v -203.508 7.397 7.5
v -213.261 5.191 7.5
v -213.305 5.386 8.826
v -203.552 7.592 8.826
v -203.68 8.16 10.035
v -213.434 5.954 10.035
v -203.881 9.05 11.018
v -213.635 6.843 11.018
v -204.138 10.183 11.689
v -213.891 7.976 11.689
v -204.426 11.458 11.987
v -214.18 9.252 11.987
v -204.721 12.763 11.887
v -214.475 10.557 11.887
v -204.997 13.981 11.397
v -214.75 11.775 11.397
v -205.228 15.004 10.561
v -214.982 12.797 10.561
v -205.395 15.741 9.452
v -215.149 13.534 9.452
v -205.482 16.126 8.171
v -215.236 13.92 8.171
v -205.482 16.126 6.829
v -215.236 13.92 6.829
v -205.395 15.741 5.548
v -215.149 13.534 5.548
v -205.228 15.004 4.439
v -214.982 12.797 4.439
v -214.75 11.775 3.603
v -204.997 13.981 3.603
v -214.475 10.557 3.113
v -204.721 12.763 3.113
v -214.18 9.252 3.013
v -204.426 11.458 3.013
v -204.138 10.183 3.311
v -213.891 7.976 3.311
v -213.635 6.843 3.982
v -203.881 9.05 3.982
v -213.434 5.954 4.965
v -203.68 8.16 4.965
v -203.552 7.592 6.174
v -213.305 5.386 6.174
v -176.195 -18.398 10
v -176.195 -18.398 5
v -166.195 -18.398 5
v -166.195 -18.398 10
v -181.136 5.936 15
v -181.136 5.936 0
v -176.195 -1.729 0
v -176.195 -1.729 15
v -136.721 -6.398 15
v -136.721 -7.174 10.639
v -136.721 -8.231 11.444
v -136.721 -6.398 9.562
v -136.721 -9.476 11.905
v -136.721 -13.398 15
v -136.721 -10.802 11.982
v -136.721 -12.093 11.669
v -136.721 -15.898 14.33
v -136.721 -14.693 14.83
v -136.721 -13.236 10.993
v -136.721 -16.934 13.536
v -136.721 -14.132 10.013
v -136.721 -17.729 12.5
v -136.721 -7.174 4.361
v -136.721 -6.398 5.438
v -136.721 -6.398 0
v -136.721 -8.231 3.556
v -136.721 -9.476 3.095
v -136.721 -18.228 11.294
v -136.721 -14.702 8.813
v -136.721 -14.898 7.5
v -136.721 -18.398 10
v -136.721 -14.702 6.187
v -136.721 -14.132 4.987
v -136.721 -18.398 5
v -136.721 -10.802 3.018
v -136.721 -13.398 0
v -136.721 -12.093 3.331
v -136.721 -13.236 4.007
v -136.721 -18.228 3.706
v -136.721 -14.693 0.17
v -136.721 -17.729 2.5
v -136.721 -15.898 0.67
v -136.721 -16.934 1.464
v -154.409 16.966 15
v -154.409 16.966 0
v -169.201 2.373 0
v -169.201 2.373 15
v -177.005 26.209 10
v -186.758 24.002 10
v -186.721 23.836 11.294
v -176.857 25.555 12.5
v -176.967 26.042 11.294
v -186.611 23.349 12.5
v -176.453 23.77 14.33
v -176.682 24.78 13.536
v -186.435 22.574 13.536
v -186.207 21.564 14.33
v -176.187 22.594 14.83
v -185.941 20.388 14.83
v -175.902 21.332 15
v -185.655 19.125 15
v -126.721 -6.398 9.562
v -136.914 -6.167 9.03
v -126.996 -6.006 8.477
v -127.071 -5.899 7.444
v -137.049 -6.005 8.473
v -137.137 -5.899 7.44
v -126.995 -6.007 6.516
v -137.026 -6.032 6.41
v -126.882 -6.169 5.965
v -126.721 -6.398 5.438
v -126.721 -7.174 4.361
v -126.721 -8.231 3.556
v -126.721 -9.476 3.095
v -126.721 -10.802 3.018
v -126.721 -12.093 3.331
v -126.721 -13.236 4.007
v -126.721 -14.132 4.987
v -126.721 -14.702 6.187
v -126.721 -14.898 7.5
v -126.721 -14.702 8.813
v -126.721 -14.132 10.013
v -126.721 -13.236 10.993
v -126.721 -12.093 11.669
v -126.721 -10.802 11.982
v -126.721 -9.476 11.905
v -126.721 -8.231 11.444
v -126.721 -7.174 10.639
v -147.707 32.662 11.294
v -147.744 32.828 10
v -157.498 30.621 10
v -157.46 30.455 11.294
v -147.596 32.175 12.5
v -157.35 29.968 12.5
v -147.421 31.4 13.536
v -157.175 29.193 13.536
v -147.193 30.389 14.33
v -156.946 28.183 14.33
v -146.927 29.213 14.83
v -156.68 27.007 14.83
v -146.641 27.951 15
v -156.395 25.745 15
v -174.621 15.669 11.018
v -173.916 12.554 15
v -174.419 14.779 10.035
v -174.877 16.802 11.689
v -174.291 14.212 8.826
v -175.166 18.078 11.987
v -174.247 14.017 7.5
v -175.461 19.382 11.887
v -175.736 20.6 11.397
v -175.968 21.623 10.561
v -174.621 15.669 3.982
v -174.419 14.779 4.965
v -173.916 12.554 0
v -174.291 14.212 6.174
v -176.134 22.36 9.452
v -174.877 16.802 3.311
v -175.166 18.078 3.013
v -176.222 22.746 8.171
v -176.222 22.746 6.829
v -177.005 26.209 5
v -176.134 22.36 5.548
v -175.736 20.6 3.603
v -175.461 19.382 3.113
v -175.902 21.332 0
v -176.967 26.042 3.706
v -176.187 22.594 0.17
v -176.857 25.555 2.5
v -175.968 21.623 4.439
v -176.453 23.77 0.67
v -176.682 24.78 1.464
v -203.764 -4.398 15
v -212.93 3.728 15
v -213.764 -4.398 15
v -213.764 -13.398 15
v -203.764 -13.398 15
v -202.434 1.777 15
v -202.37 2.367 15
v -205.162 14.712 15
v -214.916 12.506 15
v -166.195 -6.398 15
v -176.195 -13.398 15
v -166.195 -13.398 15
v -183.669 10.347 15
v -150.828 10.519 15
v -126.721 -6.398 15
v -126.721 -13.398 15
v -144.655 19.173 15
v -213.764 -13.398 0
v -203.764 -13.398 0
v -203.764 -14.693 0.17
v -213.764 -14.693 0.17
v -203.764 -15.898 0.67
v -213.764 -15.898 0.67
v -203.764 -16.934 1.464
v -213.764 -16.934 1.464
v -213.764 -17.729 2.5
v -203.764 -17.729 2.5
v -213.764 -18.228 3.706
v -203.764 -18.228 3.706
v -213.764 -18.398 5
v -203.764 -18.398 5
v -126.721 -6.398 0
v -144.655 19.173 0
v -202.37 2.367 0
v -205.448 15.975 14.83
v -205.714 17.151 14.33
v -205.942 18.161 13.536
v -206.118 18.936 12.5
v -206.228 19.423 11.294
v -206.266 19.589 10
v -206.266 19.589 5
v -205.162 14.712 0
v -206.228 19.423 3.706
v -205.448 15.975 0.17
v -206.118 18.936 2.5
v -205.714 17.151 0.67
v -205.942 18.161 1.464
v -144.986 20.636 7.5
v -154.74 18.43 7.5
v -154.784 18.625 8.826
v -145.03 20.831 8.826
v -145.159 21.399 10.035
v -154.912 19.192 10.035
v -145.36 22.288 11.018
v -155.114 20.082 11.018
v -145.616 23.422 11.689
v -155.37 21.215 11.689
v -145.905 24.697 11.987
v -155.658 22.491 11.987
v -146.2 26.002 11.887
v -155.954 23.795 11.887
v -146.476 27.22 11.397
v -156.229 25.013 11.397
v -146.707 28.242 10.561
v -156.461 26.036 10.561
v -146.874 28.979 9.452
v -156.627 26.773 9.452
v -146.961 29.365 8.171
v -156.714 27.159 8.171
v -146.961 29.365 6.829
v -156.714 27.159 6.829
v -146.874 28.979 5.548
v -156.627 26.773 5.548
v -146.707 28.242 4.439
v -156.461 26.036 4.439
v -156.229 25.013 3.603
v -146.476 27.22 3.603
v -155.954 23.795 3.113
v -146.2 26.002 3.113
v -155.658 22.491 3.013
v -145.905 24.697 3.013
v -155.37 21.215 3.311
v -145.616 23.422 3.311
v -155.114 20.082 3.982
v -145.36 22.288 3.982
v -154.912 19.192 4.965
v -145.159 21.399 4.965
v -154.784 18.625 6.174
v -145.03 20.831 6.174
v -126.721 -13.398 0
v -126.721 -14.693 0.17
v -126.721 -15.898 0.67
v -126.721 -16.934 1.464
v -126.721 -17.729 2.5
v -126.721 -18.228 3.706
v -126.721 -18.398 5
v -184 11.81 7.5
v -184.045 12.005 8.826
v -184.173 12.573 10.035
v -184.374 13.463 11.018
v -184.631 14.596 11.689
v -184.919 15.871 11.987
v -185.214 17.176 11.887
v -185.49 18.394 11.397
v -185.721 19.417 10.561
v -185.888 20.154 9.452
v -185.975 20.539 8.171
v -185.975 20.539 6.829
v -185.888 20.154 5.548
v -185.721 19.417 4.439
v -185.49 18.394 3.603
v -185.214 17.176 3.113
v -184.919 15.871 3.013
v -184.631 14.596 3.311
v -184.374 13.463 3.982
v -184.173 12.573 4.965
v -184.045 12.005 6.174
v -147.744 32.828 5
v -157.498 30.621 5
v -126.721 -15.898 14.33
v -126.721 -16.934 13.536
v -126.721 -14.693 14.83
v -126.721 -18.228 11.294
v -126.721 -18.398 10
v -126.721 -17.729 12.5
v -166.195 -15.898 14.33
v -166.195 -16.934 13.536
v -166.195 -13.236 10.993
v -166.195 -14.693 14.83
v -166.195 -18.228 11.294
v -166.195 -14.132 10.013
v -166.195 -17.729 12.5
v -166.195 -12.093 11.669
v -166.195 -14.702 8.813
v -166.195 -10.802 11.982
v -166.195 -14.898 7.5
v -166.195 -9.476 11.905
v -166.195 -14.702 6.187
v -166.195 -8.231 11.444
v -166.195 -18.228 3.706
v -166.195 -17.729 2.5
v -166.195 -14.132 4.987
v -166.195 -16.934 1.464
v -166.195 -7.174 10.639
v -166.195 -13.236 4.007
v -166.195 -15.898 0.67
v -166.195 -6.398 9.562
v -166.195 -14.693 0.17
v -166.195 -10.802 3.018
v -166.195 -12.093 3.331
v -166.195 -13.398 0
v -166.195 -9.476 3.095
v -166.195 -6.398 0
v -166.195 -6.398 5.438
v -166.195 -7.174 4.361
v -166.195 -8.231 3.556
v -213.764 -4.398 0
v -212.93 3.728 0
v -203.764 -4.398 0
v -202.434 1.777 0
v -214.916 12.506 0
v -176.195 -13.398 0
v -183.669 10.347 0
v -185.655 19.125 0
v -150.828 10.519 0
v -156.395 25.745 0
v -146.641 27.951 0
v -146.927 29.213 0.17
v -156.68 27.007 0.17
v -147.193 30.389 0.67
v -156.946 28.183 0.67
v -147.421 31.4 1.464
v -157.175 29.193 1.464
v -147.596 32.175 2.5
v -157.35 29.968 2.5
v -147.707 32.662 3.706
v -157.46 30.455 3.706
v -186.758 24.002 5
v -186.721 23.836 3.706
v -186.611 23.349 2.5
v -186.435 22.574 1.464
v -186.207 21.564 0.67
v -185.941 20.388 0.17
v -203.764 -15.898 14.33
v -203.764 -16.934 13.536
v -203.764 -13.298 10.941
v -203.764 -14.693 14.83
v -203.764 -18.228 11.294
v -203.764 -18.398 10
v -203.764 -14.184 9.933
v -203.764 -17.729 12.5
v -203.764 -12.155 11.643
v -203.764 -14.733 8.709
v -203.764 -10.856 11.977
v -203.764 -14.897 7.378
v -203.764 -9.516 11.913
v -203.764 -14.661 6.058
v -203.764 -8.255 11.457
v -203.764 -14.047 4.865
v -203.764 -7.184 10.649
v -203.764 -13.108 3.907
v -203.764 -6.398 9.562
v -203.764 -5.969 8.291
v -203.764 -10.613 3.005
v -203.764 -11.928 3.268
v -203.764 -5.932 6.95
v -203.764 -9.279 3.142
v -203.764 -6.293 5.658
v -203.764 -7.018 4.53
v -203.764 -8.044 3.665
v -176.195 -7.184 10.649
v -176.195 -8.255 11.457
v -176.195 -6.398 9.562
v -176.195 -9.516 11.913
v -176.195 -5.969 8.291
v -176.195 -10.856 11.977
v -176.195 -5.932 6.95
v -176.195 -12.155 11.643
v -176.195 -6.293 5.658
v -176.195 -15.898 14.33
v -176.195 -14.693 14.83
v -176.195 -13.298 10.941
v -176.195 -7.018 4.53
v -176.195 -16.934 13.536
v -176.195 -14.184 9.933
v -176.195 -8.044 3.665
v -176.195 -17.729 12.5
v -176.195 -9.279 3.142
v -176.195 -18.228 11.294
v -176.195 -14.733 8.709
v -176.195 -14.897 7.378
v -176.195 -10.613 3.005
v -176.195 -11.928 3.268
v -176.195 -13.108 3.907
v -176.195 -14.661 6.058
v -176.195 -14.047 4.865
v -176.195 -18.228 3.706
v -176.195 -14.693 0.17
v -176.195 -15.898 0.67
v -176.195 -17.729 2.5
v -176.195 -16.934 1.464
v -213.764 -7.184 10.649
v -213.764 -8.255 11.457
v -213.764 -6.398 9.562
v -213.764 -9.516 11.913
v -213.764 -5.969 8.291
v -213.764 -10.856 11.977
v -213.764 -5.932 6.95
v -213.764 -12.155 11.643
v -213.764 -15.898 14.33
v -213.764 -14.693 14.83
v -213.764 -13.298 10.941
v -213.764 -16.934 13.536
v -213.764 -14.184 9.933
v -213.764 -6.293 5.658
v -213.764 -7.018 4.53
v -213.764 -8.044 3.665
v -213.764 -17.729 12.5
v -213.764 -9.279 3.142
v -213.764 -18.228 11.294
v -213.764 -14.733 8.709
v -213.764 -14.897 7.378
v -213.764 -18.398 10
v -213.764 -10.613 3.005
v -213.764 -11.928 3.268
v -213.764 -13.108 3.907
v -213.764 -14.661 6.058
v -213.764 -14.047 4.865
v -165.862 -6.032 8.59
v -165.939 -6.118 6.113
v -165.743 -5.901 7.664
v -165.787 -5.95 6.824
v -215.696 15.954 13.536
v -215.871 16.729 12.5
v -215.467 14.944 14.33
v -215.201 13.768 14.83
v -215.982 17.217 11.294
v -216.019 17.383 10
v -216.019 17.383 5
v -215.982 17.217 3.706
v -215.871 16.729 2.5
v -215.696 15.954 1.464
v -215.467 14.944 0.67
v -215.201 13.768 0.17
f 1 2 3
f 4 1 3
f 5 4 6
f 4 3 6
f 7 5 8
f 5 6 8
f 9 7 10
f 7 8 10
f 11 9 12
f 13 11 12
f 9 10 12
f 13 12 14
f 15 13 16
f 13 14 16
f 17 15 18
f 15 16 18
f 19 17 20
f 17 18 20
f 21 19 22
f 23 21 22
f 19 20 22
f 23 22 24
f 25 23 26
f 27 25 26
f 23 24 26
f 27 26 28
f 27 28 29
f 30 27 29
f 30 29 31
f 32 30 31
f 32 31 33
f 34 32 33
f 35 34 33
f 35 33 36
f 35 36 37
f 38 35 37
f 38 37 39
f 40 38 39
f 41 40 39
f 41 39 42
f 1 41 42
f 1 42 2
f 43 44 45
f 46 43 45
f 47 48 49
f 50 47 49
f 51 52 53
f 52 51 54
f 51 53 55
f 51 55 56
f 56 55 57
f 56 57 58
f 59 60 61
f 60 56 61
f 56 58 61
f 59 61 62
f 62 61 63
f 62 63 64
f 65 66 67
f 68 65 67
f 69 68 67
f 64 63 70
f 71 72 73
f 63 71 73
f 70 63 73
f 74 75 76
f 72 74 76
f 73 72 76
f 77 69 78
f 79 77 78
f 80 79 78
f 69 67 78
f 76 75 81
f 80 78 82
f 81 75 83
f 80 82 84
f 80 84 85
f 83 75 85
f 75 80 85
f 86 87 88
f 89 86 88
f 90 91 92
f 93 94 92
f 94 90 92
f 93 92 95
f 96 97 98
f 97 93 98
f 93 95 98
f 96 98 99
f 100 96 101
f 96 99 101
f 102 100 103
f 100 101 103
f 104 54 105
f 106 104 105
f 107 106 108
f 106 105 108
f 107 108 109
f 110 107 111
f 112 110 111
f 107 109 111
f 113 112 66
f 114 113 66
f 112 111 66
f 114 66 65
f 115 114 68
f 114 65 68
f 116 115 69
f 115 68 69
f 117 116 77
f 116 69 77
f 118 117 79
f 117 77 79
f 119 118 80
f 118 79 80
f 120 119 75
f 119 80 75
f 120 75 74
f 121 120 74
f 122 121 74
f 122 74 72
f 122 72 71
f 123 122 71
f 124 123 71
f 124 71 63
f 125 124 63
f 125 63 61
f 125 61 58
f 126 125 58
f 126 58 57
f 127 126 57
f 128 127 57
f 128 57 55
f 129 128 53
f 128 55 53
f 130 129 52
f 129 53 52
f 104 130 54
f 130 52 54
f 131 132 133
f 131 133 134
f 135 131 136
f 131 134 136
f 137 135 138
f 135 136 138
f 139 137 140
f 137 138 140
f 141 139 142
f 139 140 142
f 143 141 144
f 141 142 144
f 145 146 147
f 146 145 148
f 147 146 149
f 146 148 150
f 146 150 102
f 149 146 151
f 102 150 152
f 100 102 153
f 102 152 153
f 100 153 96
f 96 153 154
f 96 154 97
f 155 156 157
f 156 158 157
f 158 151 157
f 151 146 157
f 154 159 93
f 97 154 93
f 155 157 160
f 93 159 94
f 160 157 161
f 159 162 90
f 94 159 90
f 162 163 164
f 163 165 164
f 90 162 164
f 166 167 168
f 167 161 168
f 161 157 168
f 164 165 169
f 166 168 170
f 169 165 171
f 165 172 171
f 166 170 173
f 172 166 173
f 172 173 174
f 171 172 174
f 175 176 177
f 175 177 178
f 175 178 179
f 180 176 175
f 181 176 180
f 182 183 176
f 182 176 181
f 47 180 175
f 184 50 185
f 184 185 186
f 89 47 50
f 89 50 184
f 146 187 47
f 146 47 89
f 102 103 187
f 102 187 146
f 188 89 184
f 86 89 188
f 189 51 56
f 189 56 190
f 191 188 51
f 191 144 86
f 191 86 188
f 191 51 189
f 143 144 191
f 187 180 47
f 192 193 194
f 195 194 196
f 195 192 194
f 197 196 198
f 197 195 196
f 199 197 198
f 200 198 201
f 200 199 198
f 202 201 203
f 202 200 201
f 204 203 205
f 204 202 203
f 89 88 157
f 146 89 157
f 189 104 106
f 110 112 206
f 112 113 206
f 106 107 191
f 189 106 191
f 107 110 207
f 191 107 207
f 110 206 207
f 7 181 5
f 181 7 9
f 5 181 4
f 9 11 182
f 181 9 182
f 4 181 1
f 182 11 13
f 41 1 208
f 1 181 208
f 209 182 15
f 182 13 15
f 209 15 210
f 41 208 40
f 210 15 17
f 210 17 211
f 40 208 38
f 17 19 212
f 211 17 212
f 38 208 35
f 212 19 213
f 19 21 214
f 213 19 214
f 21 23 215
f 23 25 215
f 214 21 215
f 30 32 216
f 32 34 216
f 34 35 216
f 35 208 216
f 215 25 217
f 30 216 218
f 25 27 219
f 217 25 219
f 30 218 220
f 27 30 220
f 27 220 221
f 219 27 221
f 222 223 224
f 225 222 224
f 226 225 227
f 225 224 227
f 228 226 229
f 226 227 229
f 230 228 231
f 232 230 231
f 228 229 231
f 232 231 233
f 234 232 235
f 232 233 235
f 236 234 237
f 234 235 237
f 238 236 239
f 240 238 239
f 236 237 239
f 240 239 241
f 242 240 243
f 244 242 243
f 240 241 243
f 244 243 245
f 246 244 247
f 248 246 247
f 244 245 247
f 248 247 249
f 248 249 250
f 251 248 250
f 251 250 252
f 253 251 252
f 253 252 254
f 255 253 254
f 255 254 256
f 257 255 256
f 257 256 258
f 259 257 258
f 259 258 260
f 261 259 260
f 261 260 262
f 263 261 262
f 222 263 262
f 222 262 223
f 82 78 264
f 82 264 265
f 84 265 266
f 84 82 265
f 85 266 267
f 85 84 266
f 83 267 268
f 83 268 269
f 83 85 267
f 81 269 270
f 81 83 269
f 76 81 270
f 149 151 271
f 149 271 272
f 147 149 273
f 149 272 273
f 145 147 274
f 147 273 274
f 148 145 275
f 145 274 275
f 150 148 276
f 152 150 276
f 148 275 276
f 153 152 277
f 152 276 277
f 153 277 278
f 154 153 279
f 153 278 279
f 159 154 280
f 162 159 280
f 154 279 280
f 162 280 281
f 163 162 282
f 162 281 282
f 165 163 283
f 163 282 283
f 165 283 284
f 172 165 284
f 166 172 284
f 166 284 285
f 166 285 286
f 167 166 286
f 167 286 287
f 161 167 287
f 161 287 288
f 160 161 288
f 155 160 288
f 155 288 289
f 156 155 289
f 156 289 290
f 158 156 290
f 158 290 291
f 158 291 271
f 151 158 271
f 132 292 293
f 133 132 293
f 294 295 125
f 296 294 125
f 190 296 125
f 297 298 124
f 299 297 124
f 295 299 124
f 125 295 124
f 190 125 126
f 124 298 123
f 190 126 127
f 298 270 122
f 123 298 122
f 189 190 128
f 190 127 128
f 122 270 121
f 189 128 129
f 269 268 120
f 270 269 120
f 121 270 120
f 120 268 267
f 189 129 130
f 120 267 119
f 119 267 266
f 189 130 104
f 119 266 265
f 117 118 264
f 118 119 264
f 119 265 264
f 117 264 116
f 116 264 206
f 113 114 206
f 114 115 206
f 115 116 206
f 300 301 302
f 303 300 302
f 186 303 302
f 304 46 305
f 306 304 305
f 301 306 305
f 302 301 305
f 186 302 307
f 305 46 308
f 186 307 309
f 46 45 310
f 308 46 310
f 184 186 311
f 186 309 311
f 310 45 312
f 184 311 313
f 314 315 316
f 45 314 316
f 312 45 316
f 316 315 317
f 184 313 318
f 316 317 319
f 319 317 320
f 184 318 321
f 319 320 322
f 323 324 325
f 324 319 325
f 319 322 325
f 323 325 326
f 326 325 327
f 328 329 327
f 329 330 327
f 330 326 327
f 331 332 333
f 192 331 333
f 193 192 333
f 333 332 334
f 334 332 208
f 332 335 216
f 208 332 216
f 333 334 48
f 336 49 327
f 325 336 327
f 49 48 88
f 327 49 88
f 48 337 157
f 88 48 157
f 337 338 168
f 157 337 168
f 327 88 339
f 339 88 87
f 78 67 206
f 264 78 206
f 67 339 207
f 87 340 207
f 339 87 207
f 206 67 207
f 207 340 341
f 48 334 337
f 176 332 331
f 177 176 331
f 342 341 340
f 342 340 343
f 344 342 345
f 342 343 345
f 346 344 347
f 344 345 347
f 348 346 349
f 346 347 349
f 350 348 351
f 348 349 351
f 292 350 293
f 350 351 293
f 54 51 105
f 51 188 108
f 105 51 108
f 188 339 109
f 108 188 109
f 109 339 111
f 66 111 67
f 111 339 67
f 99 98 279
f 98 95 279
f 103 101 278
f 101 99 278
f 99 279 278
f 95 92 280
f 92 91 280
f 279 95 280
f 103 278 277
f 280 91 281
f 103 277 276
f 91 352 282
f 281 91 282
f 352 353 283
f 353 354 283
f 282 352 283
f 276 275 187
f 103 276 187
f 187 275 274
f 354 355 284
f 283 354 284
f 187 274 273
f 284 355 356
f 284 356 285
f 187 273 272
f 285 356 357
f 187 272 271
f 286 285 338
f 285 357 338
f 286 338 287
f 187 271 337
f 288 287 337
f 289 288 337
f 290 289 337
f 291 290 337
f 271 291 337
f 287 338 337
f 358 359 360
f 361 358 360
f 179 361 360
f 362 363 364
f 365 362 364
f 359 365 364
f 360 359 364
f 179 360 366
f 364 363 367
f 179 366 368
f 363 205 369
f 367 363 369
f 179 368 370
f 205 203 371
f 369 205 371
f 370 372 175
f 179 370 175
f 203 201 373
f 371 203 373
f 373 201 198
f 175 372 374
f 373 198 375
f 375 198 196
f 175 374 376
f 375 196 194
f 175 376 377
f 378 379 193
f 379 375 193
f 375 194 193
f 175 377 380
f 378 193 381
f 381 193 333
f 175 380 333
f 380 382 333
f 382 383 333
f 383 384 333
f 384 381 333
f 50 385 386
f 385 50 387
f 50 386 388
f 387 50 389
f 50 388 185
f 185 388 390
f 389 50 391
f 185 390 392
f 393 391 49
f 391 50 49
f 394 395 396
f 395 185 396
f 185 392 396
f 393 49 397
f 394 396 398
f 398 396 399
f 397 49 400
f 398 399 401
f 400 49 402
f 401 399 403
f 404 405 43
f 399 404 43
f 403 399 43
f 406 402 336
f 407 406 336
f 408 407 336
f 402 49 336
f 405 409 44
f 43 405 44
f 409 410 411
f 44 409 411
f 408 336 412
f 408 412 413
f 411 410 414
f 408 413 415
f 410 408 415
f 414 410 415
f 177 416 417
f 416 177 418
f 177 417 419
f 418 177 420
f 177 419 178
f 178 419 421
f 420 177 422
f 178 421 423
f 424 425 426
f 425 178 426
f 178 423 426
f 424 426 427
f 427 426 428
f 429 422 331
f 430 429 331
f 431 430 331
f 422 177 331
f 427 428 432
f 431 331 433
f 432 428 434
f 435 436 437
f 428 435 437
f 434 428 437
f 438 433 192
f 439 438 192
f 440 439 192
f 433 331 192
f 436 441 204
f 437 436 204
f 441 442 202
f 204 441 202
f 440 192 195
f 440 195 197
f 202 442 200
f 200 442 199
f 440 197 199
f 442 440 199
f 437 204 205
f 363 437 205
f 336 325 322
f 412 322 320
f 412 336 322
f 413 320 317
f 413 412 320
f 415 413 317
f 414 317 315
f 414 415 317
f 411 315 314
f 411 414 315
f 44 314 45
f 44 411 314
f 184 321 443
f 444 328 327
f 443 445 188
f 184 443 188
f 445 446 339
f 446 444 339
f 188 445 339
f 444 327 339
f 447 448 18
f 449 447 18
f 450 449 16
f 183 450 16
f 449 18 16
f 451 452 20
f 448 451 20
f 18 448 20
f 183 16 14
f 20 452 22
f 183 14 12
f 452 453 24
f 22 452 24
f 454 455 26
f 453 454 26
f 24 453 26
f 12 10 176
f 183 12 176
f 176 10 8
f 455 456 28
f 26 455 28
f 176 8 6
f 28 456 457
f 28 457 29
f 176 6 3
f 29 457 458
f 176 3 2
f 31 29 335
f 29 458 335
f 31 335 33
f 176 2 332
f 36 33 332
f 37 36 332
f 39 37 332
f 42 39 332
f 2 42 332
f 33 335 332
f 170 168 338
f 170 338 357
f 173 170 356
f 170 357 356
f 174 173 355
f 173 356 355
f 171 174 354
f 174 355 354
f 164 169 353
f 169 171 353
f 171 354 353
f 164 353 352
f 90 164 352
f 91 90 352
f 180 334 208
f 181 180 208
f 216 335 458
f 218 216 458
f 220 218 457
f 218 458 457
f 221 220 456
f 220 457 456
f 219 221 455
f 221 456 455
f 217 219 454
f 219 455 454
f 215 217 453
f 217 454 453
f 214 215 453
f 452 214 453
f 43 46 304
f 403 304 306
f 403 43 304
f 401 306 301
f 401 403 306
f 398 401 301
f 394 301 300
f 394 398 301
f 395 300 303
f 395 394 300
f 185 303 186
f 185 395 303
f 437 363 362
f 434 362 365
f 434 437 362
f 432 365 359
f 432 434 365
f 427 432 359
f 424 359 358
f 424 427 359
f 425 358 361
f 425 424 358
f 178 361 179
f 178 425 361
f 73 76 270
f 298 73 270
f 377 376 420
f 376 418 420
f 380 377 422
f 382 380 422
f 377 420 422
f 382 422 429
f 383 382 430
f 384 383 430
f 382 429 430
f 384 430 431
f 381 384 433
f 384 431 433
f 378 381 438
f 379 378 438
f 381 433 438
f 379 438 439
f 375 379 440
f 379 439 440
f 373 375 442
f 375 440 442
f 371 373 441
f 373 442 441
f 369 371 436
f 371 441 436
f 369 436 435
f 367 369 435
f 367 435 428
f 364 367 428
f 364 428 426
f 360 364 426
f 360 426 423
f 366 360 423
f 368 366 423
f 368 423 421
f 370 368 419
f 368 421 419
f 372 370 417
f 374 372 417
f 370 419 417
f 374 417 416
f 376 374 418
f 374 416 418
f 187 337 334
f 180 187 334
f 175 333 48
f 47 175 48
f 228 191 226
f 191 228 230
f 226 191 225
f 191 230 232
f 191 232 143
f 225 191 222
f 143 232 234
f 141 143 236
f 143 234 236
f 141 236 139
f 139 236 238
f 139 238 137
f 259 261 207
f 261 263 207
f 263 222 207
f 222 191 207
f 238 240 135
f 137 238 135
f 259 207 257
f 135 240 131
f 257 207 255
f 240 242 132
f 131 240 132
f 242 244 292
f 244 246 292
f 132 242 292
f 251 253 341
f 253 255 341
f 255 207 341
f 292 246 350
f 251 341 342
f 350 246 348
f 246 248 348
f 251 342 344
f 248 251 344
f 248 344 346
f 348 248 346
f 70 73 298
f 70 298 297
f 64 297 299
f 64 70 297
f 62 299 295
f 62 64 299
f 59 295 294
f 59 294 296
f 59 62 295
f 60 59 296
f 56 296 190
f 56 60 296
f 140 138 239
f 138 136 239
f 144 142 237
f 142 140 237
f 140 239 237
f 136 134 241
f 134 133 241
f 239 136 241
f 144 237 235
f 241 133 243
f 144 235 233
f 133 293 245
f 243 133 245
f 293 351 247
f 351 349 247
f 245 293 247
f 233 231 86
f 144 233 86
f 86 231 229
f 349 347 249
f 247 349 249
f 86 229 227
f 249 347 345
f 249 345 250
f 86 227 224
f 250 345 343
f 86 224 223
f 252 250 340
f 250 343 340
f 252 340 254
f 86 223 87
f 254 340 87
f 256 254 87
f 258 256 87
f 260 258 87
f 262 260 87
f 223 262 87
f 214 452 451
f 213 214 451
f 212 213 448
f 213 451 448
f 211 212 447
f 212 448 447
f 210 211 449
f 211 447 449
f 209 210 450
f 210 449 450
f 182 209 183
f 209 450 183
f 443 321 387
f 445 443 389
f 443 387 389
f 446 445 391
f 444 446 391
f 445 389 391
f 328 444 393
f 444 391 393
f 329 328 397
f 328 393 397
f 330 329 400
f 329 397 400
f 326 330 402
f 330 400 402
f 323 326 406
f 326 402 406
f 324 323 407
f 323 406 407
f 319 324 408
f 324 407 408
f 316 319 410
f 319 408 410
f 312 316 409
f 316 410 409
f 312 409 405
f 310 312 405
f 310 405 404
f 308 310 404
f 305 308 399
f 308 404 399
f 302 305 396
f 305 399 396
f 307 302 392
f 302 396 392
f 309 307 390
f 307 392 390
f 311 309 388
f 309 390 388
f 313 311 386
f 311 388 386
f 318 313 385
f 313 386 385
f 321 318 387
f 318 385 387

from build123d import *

# Parameters (mm, degrees)
BOSS_EXTRUDE1_DEPTH = 15
SKETCH3_R           = 4.5
CUT_EXTRUDE1_DEPTH  = 110.607127014
SKETCH4_R           = 4.5
CUT_EXTRUDE2_DEPTH  = 95.229658783


with BuildPart() as part:
    # Sketch2 → Boss-Extrude1 (new body)
    with BuildSketch(Plane.XY):
        Polygon((-216.019091895, 17.382825188), (-212.930081555, 3.727862166), (-213.764027452, -4.398444723), (-213.764027452, -18.398444723), (-203.764027452, -18.398444723), (-203.764027452, -4.398444723), (-181.136073294, 5.936039038), (-176.194518086, -1.729112182), (-176.194518086, -18.398444723), (-166.194518086, -18.398444723), (-166.194518086, -6.398444723), (-150.828445352, 10.518587471), (-136.720595227, -6.398444723), (-136.720595227, -18.398444723), (-126.720595227, -18.398444723), (-126.720595227, -6.398444723), (-144.655266447, 19.172913865), (-147.744276787, 32.827876887), (-157.497821802, 30.62144093), (-154.408811463, 16.966477908), (-169.201460721, 2.373183741), (-173.915901493, 12.553605994), (-177.004911833, 26.208569016), (-186.758456849, 24.002133059), (-183.669446509, 10.347170037), (-202.433997642, 1.777153163), (-202.369507285, 2.366827181), (-206.265546879, 19.589261145), align=None)
    extrude(amount=BOSS_EXTRUDE1_DEPTH)

    # Sketch3 → Cut-Extrude1 (cut, through all)
    with BuildSketch(Plane(origin=(-201.761622141, -45.642286691, 0), x_dir=(0, 0, 1), z_dir=(-0.9753545015403321, -0.22064359570359257, 0))):
        with Locations(Location((7.5, 56.617645973, 0), (0, 0, 270))):
            Circle(SKETCH3_R)
        with BuildLine():
            Line((15, 59.617645973), (20.879218682, 59.617645973))
            Line((20.879218682, 59.617645973), (20.879218682, 67.791125086))
            Line((20.879218682, 67.791125086), (14.372574649, 67.791125086))
            Line((14.372574649, 67.791125086), (-2.562016451, 67.791125086))
            Line((-2.562016451, 67.791125086), (-2.562016451, 59.617645973))
            Line((-2.562016451, 59.617645973), (0, 59.617645973))
            ThreePointArc((0, 59.617645973), (1.464466094, 63.153179879), (5, 64.617645973))
            Line((5, 64.617645973), (8.859819986, 64.617645973))
            Line((8.859819986, 64.617645973), (10, 64.617645973))
            ThreePointArc((10, 64.617645973), (13.535533906, 63.153179879), (15, 59.617645973))
        make_face()
    extrude(amount=-CUT_EXTRUDE1_DEPTH, mode=Mode.SUBTRACT)

    # Sketch4 → Cut-Extrude2 (cut, through all)
    with BuildSketch(Plane.ZY.offset(213.764027452)):
        with Locations(Location((7.5, -10.398444723, 0), (0, 0, 62.733955549))):
            Circle(SKETCH4_R)
        with BuildLine():
            Line((5, -18.398444723), (10, -18.398444723))
            ThreePointArc((10, -18.398444723), (13.535533906, -16.933978629), (15, -13.398444723))
            Line((15, -13.398444723), (20.19317818, -13.398444723))
            Line((20.19317818, -13.398444723), (20.19317818, -22.025318281))
            Line((20.19317818, -22.025318281), (-2.656583896, -22.025318281))
            Line((-2.656583896, -22.025318281), (-2.656583896, -13.398444723))
            Line((-2.656583896, -13.398444723), (0, -13.398444723))
            ThreePointArc((0, -13.398444723), (1.464466094, -16.933978629), (5, -18.398444723))
        make_face()
    extrude(amount=-CUT_EXTRUDE2_DEPTH, mode=Mode.SUBTRACT)


solid = part.part
